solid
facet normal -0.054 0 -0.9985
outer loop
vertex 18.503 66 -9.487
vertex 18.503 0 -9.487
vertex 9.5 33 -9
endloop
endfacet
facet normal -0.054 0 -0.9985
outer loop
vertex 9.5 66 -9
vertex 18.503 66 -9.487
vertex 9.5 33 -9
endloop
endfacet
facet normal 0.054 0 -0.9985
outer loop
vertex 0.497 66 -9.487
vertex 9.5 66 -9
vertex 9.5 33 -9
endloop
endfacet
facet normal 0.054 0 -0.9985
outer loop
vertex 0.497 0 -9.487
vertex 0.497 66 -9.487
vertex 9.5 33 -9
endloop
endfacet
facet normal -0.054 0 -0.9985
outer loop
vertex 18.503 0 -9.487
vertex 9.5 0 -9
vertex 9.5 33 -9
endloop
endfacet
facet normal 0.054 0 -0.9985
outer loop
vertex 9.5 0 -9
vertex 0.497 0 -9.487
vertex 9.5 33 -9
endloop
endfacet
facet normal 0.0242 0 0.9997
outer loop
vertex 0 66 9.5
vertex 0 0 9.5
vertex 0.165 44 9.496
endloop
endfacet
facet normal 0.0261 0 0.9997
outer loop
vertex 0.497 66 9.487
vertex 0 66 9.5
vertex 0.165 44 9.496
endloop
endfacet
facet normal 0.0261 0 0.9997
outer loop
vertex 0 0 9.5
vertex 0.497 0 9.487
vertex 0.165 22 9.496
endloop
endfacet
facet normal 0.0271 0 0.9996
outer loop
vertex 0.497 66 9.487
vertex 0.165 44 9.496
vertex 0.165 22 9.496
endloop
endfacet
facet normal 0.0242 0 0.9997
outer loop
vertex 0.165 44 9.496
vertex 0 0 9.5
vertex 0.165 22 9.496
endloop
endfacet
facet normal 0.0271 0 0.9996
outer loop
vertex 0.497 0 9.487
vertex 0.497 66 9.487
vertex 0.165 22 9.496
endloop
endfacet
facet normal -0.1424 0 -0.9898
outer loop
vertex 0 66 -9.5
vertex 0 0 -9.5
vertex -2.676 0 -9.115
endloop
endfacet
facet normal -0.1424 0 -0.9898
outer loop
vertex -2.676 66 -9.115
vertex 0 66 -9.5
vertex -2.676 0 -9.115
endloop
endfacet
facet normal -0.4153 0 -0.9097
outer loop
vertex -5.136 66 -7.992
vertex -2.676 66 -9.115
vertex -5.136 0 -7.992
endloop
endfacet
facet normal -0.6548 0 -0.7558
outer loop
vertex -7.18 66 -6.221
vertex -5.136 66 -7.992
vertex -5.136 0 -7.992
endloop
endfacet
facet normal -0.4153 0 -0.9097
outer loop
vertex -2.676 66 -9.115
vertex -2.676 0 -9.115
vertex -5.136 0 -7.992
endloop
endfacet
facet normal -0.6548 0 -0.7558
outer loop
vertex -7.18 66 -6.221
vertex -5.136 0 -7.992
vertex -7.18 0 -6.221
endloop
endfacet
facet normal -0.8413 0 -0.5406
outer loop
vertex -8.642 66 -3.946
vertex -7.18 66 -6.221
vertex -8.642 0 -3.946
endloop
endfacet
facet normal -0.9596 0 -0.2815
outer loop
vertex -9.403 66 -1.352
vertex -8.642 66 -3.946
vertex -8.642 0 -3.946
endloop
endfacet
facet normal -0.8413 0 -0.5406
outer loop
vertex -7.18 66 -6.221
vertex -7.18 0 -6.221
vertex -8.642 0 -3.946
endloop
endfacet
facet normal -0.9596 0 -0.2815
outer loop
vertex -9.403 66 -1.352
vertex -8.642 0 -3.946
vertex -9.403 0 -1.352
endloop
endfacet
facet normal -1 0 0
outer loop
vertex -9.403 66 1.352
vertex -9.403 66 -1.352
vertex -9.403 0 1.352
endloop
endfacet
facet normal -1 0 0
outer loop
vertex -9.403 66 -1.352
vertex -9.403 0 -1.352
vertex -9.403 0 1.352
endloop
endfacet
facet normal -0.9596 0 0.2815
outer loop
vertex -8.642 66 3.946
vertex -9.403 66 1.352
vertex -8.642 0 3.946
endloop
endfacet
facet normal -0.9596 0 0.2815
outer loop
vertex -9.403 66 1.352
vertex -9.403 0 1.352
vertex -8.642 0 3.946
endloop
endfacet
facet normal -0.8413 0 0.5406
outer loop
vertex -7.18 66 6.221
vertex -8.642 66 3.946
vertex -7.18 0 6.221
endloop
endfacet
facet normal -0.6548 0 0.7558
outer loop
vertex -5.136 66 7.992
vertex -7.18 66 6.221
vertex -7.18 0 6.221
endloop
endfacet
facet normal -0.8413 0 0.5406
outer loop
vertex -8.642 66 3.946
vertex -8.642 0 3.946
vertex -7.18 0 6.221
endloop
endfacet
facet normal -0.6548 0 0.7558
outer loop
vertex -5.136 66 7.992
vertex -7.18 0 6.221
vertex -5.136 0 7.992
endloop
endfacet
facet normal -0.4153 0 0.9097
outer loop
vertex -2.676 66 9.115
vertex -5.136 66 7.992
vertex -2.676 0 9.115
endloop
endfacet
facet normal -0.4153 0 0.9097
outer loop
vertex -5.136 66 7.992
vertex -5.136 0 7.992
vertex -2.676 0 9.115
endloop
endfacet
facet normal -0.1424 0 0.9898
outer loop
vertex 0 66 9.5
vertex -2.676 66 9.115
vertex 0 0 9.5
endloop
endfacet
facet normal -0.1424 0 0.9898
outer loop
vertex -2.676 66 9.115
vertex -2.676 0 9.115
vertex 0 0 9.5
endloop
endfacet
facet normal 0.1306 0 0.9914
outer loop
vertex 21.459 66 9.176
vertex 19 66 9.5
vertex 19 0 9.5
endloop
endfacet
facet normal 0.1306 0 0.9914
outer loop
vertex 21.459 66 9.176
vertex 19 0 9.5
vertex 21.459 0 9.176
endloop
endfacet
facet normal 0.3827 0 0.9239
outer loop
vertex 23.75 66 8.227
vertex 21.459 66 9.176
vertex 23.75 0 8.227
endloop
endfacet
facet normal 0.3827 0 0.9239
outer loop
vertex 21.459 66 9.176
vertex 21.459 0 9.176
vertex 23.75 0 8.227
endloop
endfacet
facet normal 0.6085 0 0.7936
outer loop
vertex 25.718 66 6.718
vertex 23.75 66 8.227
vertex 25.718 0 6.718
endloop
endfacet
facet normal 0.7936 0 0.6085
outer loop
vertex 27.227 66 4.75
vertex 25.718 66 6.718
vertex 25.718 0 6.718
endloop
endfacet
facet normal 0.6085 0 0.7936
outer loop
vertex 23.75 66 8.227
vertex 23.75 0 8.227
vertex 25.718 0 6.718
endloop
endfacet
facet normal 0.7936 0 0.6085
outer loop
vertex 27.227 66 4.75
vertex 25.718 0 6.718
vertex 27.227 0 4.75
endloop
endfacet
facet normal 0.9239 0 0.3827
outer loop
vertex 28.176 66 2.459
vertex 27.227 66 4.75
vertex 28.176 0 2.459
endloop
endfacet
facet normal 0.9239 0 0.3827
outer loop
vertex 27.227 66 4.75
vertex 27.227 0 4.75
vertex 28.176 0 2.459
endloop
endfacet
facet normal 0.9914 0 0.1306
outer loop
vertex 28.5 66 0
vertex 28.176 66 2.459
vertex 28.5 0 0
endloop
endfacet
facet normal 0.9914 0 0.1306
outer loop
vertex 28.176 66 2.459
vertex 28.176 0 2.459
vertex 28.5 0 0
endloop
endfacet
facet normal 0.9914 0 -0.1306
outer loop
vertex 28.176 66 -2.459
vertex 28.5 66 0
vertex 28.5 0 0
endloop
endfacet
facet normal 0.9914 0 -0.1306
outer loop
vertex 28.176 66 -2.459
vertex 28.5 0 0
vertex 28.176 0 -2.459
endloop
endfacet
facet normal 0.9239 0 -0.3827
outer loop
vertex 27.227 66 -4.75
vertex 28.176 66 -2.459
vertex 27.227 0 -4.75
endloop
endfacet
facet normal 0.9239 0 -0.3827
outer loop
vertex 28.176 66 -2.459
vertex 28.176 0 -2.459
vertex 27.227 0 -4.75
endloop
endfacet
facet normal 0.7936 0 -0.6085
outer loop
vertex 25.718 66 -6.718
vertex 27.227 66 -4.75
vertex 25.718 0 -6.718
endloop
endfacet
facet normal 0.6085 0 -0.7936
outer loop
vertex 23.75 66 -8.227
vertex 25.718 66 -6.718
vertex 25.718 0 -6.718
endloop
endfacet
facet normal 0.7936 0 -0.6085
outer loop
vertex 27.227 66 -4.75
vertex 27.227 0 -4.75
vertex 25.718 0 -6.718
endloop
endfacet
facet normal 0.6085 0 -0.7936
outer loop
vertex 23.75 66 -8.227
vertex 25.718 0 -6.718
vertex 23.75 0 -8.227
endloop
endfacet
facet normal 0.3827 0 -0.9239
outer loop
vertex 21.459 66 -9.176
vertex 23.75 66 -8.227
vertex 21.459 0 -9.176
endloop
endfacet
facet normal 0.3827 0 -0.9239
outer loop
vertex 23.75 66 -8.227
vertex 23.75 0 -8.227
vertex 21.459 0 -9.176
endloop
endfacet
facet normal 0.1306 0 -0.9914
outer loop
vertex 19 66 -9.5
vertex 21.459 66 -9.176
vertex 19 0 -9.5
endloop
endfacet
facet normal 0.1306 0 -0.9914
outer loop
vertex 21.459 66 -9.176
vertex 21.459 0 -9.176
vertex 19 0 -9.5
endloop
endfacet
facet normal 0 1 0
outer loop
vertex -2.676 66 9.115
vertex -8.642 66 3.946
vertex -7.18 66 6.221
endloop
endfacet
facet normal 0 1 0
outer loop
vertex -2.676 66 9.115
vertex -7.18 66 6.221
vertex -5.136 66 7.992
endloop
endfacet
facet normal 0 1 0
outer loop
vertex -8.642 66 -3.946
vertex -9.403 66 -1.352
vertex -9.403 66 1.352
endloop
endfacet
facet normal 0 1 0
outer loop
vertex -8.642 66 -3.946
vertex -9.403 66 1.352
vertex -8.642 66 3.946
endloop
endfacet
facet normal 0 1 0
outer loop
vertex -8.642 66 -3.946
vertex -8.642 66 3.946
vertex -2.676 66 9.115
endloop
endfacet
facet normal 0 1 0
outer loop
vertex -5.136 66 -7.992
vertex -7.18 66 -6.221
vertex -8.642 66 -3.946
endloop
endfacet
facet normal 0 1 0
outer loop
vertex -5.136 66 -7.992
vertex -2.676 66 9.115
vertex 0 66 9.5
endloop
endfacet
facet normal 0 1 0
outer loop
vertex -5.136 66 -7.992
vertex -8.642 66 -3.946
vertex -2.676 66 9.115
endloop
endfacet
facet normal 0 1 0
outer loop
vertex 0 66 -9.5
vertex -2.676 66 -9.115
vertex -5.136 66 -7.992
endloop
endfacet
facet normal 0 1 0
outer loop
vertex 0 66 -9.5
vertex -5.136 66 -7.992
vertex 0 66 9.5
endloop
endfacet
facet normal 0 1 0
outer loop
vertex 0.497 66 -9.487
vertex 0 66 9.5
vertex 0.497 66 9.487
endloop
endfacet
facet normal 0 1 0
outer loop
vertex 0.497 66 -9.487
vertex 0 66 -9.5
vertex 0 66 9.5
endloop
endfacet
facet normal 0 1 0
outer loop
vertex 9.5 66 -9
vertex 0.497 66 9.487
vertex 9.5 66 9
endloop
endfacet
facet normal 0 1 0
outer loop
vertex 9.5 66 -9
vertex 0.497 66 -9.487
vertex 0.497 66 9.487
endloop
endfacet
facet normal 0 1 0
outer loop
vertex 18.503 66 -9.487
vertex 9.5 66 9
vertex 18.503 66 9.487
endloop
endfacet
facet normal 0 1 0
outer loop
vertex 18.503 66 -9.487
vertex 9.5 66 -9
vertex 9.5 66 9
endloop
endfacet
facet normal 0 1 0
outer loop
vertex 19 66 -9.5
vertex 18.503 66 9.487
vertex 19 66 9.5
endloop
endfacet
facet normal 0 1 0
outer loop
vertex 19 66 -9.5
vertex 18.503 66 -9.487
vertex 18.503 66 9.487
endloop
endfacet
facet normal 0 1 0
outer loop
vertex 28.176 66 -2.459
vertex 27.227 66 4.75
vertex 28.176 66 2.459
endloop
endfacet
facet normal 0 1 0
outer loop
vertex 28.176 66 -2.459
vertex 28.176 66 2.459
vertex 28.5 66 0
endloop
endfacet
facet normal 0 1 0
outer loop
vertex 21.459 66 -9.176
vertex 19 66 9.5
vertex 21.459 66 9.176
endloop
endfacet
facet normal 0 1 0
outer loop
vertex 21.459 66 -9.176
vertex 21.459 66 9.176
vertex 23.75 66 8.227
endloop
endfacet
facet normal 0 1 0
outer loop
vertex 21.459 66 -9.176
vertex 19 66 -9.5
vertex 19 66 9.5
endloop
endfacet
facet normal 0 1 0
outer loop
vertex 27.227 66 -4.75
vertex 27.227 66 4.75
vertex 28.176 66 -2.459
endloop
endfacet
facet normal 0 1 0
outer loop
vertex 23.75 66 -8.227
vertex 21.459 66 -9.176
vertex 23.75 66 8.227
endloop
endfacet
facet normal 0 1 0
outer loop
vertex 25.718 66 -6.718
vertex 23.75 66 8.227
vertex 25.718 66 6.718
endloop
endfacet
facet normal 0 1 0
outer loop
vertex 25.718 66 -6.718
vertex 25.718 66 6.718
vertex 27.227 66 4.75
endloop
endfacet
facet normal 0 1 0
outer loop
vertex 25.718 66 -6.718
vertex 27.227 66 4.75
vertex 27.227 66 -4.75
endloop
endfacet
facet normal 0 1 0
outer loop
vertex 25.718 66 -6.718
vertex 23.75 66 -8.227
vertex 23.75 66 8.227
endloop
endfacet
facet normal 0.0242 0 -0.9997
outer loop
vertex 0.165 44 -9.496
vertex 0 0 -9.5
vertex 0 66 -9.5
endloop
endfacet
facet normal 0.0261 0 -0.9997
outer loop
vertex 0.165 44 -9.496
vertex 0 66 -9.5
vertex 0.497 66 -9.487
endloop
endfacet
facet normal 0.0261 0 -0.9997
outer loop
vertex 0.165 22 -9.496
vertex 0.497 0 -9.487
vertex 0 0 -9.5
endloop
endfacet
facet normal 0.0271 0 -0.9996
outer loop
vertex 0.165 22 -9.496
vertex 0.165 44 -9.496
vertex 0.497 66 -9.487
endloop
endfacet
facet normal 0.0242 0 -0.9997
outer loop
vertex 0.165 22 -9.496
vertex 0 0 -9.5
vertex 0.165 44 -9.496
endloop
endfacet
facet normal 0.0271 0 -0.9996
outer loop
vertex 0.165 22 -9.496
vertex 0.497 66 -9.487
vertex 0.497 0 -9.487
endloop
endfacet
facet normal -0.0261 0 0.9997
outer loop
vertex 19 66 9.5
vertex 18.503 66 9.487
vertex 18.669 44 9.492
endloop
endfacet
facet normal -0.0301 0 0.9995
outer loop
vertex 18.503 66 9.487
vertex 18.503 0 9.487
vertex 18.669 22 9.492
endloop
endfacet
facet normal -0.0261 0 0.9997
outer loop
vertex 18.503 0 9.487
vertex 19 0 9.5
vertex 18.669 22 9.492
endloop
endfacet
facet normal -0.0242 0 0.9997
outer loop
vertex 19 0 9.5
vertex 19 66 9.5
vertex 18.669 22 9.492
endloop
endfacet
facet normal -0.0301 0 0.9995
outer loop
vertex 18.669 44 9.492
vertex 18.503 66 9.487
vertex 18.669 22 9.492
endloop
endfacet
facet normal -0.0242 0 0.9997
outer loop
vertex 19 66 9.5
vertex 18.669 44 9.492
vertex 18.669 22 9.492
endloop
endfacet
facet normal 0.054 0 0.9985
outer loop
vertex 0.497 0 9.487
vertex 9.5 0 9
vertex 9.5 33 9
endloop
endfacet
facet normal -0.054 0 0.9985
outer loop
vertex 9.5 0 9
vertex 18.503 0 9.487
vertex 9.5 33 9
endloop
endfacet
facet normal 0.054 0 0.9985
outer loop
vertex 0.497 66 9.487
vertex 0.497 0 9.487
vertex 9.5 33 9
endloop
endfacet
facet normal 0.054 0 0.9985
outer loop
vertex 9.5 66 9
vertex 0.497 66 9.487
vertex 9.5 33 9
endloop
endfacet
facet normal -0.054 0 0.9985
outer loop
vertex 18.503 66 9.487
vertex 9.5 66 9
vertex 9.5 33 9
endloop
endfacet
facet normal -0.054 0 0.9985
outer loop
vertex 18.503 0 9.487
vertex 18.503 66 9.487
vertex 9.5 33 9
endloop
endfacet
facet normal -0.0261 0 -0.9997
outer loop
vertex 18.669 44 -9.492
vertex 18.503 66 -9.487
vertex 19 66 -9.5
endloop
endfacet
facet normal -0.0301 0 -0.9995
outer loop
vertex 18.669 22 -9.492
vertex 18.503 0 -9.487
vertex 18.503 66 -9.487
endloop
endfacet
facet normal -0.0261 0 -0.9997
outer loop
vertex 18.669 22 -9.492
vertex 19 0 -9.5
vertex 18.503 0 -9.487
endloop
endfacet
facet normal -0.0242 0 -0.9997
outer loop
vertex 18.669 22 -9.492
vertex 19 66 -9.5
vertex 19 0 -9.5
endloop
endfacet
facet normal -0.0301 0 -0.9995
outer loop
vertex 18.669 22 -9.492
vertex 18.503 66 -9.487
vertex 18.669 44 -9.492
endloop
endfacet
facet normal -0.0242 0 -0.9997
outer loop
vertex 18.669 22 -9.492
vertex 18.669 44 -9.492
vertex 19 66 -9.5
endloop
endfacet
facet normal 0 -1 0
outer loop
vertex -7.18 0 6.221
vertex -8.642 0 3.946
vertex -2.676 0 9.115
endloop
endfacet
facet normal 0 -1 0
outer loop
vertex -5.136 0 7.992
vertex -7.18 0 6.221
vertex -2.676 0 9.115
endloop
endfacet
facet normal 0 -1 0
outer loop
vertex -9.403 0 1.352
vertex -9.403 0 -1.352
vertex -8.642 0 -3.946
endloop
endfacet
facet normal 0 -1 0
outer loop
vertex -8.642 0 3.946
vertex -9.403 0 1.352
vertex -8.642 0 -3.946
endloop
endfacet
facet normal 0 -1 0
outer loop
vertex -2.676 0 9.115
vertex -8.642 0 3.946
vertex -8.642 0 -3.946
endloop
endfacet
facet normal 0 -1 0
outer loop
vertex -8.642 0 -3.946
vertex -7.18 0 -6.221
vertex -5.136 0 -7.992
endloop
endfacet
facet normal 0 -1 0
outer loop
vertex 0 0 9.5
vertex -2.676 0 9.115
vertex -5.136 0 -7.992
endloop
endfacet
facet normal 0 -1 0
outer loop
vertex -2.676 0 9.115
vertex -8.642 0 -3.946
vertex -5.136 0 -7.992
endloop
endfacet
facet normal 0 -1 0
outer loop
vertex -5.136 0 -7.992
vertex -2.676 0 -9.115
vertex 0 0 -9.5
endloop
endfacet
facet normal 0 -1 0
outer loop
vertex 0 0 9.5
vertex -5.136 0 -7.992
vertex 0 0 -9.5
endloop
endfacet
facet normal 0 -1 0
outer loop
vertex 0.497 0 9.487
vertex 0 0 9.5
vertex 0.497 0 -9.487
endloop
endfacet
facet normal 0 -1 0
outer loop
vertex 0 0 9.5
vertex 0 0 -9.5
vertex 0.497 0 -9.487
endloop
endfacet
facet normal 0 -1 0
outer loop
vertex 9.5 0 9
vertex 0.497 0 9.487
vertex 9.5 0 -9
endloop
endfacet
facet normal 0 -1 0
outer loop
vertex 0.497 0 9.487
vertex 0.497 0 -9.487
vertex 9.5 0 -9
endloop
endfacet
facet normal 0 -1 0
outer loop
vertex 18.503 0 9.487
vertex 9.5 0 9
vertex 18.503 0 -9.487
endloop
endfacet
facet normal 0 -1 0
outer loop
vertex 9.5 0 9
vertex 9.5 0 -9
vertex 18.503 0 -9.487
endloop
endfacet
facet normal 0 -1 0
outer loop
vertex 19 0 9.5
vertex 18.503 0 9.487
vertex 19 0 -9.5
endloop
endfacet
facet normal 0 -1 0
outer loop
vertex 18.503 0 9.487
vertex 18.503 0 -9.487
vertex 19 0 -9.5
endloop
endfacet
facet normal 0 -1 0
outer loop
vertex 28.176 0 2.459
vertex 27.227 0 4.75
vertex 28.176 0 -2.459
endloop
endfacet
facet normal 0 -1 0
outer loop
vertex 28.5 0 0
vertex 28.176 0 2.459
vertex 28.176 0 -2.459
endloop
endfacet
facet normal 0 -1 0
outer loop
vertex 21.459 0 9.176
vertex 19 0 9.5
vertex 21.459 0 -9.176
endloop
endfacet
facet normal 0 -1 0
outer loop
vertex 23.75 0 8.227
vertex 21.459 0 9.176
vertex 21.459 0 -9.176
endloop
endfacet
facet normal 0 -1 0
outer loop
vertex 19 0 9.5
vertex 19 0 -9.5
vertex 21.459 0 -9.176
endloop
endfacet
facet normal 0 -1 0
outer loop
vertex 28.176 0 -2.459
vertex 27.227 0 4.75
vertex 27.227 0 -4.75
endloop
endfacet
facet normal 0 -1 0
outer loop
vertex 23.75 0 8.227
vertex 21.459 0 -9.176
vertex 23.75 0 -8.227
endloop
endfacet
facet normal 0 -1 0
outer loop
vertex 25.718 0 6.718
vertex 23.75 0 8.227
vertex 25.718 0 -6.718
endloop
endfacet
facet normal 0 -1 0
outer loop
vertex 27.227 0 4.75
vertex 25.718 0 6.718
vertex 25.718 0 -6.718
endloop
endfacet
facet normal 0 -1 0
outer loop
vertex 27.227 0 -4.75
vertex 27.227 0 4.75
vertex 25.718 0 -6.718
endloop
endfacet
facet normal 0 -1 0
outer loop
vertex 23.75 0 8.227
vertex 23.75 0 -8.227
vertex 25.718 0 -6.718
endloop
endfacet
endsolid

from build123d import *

# Parameters (mm, degrees)
BOSS_EXTRUDE1_DEPTH = 66


with BuildPart() as part:
    # Sketch1 → Boss-Extrude1 (new body)
    with BuildSketch(Plane(origin=(0, 0, 0), x_dir=(1, 0, 0), z_dir=(0, 1, 0))):
        with BuildLine():
            ThreePointArc((0.496605757, 9.487011264), (6.890854617, 6.539581229), (9.5, 0))
            Line((9.5, 0), (9.5, 9))
            add(Edge.make_bspline(
                [(0.496605757, 9.487011264), (3.439590397, 9.392632679), (6.469795198, 9), (9.5, 9)],
                knots=[0.303368247, 0.303368247, 0.303368247, 0.303368247, 0.5, 0.5, 0.5, 0.5], degree=3))
        make_face()
        with BuildLine():
            ThreePointArc((0.496605757, -9.487011264), (6.890854617, -6.539581229), (9.5, 0))
            ThreePointArc((9.5, 0), (6.890854617, 6.539581229), (0.496605757, 9.487011264))
            add(Edge.make_bspline(
                [(0, 9.5), (0.165247966, 9.496699631), (0.330788419, 9.492328861), (0.496605757, 9.487011264)],
                knots=[0.292289374, 0.292289374, 0.292289374, 0.292289374, 0.303368247, 0.303368247, 0.303368247, 0.303368247], degree=3))
            ThreePointArc((0, 9.5), (-9.5, 0), (0, -9.5))
            add(Edge.make_bspline(
                [(0, -9.5), (0.165247966, -9.496699631), (0.330788419, -9.492328861), (0.496605757, -9.487011264)],
                knots=[0.292289374, 0.292289374, 0.292289374, 0.292289374, 0.303368247, 0.303368247, 0.303368247, 0.303368247], degree=3))
        make_face()
        with BuildLine():
            ThreePointArc((18.503394243, -9.487011264), (12.109145383, -6.539581229), (9.5, 0))
            ThreePointArc((9.5, 0), (6.890854617, -6.539581229), (0.496605757, -9.487011264))
            add(Edge.make_bspline(
                [(0.496605757, -9.487011264), (3.439590397, -9.392632679), (9.5, -8.607367321), (15.560409603, -9.392632679), (18.503394243, -9.487011264)],
                knots=[0.303368247, 0.303368247, 0.303368247, 0.303368247, 0.5, 0.696631753, 0.696631753, 0.696631753, 0.696631753], degree=3))
        make_face()
        with BuildLine():
            Line((9.5, 9), (9.5, 0))
            ThreePointArc((9.5, 0), (12.109145383, 6.539581229), (18.503394243, 9.487011264))
            add(Edge.make_bspline(
                [(9.5, 9), (12.530204802, 9), (15.560409603, 9.392632679), (18.503394243, 9.487011264)],
                knots=[0.5, 0.5, 0.5, 0.5, 0.696631753, 0.696631753, 0.696631753, 0.696631753], degree=3))
        make_face()
        with BuildLine():
            ThreePointArc((18.503394243, 9.487011264), (12.109145383, 6.539581229), (9.5, 0))
            ThreePointArc((9.5, 0), (12.109145383, -6.539581229), (18.503394243, -9.487011264))
            add(Edge.make_bspline(
                [(18.503394243, -9.487011264), (18.669211581, -9.492328861), (18.834752034, -9.496699631), (19, -9.5)],
                knots=[0.696631753, 0.696631753, 0.696631753, 0.696631753, 0.707710626, 0.707710626, 0.707710626, 0.707710626], degree=3))
            ThreePointArc((19, -9.5), (25.717514421, -6.717514421), (28.5, 0))
            ThreePointArc((28.5, 0), (25.717514421, 6.717514421), (19, 9.5))
            add(Edge.make_bspline(
                [(18.503394243, 9.487011264), (18.669211581, 9.492328861), (18.834752034, 9.496699631), (19, 9.5)],
                knots=[0.696631753, 0.696631753, 0.696631753, 0.696631753, 0.707710626, 0.707710626, 0.707710626, 0.707710626], degree=3))
        make_face()
    extrude(amount=BOSS_EXTRUDE1_DEPTH)


solid = part.part
